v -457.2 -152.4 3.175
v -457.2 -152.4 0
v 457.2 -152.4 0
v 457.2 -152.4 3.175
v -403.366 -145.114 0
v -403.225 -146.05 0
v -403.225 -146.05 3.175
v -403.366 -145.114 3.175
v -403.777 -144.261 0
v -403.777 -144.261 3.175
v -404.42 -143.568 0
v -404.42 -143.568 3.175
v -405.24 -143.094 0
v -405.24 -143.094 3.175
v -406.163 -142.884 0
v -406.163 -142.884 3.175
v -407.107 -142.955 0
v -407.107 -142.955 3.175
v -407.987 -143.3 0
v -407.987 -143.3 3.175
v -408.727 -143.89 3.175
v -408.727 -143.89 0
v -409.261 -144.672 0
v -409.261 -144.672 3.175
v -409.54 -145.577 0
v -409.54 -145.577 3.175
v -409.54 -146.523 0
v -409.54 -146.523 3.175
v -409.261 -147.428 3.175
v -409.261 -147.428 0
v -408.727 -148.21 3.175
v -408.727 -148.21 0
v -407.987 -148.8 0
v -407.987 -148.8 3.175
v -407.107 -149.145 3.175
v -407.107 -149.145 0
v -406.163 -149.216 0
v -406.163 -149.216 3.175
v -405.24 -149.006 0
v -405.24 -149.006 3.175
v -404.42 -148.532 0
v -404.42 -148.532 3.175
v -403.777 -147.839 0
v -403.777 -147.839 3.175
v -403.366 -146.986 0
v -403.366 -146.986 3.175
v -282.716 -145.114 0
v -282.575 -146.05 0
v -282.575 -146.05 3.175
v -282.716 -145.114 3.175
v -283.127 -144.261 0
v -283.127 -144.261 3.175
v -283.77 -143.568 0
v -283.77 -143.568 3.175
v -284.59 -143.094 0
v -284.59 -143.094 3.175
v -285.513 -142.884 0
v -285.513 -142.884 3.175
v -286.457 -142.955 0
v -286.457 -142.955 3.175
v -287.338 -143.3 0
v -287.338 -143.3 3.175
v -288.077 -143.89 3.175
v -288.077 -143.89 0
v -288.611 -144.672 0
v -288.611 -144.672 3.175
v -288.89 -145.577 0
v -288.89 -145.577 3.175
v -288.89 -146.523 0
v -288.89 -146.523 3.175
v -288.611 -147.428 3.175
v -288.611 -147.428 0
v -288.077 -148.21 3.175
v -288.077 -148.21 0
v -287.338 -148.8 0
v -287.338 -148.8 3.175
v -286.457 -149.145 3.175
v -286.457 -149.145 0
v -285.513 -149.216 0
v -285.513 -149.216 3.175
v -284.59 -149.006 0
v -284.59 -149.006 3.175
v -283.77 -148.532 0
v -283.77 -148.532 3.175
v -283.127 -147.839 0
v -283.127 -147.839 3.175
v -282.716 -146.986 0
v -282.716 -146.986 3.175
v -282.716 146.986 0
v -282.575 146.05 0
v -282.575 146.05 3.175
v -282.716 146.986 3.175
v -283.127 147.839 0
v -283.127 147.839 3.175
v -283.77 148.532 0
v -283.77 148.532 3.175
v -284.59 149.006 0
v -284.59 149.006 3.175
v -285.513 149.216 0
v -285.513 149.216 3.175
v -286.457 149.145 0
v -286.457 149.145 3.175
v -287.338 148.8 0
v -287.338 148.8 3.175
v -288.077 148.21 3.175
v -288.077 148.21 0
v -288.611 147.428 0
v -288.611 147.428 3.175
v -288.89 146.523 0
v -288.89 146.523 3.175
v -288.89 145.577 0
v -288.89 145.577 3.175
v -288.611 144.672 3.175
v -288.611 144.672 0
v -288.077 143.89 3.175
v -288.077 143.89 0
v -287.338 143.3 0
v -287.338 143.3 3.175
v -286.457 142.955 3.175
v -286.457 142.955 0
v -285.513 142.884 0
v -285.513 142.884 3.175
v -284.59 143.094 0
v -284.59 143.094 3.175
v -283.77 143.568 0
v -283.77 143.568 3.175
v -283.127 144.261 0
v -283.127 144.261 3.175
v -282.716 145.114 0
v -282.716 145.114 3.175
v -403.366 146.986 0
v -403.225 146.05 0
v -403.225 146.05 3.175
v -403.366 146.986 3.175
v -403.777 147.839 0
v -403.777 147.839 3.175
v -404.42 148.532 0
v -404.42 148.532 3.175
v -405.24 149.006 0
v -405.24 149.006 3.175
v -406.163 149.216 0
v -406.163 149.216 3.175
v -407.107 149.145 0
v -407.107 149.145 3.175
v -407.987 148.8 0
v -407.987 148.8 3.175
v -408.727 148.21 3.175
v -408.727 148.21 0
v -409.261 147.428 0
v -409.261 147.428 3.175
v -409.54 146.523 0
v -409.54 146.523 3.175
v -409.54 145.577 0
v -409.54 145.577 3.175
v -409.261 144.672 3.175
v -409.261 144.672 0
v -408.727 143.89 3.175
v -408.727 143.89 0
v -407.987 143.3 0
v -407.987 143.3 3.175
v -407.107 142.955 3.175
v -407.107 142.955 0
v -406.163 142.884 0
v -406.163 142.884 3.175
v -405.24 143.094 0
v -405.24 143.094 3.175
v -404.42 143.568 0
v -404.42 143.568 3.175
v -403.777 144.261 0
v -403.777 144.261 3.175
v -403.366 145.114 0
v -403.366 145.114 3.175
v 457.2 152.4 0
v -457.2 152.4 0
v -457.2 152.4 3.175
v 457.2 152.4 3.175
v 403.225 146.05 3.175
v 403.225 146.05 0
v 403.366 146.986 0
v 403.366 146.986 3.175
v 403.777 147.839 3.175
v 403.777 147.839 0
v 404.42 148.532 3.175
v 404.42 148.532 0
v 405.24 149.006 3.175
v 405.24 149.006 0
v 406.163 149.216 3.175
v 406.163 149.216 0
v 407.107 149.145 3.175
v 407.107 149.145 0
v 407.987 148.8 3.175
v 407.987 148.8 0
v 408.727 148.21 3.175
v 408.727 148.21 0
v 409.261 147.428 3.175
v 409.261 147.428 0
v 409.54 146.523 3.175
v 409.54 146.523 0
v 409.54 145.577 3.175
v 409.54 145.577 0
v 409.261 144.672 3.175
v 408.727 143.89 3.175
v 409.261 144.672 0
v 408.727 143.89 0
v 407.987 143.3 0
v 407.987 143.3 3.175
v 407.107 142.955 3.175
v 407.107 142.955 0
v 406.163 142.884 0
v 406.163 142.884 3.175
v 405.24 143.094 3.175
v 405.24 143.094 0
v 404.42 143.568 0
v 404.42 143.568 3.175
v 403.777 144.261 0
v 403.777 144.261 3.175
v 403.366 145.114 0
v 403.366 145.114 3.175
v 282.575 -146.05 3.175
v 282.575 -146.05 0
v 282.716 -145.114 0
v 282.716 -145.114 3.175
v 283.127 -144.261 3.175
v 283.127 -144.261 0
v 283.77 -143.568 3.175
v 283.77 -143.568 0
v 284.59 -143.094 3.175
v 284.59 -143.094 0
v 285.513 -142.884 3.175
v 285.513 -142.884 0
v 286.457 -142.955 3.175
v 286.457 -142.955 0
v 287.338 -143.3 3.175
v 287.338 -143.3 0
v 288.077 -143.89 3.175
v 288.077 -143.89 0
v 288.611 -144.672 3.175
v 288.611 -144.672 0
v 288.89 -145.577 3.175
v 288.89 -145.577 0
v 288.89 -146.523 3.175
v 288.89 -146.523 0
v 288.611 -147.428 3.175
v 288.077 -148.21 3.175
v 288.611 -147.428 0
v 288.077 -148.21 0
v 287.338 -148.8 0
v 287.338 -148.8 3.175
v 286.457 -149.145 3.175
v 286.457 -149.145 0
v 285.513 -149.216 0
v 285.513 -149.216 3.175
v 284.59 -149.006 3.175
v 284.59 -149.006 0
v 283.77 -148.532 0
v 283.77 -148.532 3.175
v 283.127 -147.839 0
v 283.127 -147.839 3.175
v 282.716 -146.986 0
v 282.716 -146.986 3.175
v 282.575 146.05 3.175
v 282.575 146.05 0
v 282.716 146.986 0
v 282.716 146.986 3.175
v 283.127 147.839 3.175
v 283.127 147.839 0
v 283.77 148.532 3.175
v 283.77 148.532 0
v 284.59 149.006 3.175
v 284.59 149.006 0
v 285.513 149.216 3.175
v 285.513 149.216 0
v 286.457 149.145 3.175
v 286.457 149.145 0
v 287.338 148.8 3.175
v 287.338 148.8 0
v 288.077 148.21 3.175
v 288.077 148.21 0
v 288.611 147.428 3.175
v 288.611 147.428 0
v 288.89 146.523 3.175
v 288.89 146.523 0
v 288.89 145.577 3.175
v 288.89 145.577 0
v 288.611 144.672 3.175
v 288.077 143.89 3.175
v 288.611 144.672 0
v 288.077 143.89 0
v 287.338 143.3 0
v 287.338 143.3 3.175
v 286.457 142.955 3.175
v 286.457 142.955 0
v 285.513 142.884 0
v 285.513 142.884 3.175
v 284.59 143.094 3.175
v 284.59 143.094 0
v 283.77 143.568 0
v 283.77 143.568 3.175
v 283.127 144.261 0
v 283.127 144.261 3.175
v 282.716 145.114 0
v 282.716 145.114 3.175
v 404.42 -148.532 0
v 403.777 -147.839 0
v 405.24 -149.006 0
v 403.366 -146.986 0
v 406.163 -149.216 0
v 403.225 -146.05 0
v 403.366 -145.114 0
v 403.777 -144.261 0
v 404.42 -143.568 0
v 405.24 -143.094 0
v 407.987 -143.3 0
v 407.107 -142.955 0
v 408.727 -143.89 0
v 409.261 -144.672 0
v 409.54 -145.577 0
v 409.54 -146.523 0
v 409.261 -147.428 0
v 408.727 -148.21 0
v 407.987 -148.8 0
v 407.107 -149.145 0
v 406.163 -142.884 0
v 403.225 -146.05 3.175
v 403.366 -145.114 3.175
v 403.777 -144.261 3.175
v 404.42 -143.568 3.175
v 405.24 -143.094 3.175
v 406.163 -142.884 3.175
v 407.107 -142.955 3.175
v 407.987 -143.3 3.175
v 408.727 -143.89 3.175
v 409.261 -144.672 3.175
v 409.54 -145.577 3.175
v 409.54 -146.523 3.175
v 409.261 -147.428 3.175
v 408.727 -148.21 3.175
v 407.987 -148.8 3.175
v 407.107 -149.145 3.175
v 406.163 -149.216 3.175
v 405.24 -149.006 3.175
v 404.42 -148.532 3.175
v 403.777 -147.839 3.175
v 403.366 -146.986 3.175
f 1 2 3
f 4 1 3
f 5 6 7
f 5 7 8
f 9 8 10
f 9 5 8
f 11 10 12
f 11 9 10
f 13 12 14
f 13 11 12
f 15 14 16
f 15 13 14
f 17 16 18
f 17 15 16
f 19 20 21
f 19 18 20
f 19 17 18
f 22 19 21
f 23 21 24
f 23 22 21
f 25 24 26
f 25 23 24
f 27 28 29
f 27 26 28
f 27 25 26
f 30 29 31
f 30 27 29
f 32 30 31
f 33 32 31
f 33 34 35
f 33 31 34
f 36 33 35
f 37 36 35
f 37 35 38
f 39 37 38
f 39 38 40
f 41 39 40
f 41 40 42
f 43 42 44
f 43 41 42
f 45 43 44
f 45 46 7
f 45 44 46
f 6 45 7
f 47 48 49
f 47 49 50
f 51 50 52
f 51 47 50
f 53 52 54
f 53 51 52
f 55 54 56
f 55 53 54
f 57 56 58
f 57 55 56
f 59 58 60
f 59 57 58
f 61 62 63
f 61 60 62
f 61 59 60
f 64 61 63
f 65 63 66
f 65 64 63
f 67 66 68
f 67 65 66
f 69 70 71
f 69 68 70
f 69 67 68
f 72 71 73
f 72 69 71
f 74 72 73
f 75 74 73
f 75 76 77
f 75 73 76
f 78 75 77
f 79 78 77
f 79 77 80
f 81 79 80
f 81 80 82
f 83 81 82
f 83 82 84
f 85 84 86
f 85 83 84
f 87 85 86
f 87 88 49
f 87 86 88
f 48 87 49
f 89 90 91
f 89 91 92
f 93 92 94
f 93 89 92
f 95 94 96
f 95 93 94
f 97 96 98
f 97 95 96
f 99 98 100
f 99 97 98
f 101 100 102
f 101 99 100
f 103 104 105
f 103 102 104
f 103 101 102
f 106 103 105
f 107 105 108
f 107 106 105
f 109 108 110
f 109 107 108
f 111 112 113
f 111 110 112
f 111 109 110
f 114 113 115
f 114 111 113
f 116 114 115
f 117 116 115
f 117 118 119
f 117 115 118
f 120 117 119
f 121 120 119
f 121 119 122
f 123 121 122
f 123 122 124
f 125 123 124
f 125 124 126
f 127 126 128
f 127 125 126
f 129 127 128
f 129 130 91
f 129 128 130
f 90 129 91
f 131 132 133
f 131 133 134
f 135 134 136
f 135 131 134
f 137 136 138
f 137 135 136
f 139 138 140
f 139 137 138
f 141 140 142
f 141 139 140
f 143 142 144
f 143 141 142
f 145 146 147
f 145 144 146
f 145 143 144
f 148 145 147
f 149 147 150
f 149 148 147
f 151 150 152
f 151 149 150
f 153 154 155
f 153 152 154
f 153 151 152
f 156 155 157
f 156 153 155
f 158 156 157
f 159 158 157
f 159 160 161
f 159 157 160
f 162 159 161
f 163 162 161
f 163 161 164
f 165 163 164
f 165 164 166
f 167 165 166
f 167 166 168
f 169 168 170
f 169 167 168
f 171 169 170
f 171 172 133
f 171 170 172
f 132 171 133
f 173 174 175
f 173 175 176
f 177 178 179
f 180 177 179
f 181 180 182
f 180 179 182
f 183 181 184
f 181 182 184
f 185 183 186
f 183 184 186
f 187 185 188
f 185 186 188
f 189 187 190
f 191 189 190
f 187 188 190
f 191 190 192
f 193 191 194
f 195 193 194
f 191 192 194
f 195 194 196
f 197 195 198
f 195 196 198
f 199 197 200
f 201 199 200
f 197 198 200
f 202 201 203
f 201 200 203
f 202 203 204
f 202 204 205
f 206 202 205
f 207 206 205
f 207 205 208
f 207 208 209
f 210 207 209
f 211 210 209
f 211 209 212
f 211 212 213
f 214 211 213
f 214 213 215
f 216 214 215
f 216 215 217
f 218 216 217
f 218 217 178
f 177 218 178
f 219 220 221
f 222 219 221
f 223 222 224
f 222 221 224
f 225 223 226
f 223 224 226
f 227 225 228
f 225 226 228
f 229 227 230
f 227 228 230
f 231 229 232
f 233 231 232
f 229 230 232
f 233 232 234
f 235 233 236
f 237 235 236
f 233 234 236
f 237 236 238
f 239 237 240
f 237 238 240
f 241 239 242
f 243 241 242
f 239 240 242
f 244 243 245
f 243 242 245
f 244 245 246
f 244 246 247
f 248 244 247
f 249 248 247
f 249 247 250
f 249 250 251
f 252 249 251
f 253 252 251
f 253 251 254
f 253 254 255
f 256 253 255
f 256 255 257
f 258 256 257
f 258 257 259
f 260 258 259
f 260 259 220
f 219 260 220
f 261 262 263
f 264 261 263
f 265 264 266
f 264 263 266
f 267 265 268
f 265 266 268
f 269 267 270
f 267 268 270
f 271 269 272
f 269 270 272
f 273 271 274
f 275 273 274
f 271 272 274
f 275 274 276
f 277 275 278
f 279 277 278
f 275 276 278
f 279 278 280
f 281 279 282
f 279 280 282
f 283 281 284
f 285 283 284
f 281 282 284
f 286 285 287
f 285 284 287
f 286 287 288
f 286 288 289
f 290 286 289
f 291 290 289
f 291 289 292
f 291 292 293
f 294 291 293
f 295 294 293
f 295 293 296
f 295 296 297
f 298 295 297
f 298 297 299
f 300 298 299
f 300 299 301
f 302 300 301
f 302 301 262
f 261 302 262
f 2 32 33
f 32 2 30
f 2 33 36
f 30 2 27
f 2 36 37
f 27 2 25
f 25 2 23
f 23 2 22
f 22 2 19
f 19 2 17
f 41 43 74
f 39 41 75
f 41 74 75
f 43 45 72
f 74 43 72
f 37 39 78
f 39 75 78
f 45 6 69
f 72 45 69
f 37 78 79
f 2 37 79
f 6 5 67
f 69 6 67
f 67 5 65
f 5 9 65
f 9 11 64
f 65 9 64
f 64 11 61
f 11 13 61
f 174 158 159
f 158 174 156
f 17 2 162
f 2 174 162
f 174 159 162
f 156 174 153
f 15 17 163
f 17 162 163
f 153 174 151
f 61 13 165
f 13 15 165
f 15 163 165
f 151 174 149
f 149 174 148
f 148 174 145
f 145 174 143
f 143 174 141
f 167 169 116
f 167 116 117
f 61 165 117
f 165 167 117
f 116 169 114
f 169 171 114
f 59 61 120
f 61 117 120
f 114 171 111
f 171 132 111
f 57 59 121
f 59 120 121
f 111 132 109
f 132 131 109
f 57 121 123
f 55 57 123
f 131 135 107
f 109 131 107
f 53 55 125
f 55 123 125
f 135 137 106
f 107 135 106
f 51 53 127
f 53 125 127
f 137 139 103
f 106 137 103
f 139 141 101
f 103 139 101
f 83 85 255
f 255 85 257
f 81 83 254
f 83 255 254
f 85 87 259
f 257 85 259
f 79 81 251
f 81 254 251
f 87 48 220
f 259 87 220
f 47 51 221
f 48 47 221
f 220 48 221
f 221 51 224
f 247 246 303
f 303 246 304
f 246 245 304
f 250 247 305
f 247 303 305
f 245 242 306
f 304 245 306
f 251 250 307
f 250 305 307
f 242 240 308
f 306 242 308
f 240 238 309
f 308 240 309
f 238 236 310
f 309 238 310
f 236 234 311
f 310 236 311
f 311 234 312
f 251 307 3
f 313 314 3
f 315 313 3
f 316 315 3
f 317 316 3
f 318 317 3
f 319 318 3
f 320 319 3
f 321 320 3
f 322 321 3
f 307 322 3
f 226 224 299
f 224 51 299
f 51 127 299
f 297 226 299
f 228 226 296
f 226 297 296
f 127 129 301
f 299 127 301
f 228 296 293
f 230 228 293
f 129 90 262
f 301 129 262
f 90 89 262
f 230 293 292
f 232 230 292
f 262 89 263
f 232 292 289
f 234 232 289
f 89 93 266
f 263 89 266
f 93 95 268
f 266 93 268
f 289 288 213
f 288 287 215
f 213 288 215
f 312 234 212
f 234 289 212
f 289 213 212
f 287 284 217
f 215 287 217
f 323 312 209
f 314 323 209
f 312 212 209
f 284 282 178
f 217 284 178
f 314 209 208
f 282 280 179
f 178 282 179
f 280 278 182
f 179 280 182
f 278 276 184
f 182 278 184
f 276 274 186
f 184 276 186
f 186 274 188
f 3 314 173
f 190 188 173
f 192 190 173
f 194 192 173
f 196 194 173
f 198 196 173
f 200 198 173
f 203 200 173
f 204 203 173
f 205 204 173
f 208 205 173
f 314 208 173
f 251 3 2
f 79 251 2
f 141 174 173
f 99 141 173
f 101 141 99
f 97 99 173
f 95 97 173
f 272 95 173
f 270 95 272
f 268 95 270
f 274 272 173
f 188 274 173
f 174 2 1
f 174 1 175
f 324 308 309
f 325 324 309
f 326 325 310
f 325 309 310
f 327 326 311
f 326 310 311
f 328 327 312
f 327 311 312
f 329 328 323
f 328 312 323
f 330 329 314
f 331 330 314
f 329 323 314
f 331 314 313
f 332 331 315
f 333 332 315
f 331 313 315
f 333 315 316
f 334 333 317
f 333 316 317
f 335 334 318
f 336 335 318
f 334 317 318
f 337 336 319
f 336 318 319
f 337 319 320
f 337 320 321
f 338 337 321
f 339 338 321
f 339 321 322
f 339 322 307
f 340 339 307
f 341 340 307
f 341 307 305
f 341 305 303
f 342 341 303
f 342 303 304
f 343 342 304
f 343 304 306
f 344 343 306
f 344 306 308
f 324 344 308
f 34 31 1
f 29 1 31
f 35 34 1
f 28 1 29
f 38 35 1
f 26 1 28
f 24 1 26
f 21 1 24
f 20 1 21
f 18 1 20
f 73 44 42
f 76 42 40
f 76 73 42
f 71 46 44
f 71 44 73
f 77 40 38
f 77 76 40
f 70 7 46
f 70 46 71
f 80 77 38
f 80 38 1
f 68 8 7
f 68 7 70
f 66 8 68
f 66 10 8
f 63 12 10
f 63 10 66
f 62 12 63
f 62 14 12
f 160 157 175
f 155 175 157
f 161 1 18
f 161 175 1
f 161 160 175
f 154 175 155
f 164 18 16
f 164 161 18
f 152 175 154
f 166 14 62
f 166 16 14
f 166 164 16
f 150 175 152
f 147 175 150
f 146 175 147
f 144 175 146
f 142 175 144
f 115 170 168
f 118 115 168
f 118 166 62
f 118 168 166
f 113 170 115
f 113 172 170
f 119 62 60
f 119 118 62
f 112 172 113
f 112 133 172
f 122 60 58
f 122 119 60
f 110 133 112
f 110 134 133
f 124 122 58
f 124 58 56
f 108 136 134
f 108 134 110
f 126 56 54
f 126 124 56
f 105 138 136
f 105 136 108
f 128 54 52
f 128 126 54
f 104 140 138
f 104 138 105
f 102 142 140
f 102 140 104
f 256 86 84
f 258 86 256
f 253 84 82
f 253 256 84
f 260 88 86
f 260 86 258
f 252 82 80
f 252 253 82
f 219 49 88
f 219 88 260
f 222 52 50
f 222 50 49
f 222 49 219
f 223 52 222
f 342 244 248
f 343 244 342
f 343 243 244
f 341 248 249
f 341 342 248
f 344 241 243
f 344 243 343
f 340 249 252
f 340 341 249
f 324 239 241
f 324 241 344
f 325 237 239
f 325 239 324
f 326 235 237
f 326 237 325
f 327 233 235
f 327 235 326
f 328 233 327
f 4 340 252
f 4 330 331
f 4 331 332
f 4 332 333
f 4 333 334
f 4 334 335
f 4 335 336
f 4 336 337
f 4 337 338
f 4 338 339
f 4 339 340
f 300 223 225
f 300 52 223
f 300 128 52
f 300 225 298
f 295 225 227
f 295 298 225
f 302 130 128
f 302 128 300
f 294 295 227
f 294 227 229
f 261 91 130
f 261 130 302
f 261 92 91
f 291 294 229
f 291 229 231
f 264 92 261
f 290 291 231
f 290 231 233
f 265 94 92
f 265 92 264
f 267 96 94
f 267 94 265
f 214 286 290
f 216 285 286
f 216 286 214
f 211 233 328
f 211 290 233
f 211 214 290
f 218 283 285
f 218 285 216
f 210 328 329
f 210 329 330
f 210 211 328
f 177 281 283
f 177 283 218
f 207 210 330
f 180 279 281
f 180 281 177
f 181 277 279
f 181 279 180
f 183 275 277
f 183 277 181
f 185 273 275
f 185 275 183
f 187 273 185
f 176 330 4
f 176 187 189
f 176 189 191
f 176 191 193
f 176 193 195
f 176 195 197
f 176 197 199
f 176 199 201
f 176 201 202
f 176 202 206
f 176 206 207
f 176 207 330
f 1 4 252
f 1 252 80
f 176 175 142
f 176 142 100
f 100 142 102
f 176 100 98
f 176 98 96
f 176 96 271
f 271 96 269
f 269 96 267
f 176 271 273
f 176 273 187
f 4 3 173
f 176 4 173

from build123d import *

# Parameters (mm, degrees)
SKETCH1_W                   = 914.4
SKETCH1_H                   = 304.8
BOSS_EXTRUDE1_DEPTH         = 3.175
F_1_4_0_25_DIAMETER_HOLE1_D = 6.35


with BuildPart() as part:
    # Sketch1 → Boss-Extrude1 (new body)
    with BuildSketch(Plane.XY):
        Rectangle(SKETCH1_W, SKETCH1_H)
    extrude(amount=BOSS_EXTRUDE1_DEPTH)

    # 1/4 (0.25) Diameter Hole1 (through all)
    with Locations(Plane.XY.offset(3.175)):
        with Locations((285.75, 146.05), (406.4, 146.05), (406.4, -146.05), (285.75, -146.05)):
            f_1_4_0_25_diameter_hole1 = Hole(F_1_4_0_25_DIAMETER_HOLE1_D / 2)

    # Mirror1: 1/4 (0.25) Diameter Hole1 across plane
    add(f_1_4_0_25_diameter_hole1.mirror(Plane(origin=(0, 0, 0), x_dir=(0, 0, 1), z_dir=(1, 0, 0))), mode=Mode.SUBTRACT)


solid = part.part
